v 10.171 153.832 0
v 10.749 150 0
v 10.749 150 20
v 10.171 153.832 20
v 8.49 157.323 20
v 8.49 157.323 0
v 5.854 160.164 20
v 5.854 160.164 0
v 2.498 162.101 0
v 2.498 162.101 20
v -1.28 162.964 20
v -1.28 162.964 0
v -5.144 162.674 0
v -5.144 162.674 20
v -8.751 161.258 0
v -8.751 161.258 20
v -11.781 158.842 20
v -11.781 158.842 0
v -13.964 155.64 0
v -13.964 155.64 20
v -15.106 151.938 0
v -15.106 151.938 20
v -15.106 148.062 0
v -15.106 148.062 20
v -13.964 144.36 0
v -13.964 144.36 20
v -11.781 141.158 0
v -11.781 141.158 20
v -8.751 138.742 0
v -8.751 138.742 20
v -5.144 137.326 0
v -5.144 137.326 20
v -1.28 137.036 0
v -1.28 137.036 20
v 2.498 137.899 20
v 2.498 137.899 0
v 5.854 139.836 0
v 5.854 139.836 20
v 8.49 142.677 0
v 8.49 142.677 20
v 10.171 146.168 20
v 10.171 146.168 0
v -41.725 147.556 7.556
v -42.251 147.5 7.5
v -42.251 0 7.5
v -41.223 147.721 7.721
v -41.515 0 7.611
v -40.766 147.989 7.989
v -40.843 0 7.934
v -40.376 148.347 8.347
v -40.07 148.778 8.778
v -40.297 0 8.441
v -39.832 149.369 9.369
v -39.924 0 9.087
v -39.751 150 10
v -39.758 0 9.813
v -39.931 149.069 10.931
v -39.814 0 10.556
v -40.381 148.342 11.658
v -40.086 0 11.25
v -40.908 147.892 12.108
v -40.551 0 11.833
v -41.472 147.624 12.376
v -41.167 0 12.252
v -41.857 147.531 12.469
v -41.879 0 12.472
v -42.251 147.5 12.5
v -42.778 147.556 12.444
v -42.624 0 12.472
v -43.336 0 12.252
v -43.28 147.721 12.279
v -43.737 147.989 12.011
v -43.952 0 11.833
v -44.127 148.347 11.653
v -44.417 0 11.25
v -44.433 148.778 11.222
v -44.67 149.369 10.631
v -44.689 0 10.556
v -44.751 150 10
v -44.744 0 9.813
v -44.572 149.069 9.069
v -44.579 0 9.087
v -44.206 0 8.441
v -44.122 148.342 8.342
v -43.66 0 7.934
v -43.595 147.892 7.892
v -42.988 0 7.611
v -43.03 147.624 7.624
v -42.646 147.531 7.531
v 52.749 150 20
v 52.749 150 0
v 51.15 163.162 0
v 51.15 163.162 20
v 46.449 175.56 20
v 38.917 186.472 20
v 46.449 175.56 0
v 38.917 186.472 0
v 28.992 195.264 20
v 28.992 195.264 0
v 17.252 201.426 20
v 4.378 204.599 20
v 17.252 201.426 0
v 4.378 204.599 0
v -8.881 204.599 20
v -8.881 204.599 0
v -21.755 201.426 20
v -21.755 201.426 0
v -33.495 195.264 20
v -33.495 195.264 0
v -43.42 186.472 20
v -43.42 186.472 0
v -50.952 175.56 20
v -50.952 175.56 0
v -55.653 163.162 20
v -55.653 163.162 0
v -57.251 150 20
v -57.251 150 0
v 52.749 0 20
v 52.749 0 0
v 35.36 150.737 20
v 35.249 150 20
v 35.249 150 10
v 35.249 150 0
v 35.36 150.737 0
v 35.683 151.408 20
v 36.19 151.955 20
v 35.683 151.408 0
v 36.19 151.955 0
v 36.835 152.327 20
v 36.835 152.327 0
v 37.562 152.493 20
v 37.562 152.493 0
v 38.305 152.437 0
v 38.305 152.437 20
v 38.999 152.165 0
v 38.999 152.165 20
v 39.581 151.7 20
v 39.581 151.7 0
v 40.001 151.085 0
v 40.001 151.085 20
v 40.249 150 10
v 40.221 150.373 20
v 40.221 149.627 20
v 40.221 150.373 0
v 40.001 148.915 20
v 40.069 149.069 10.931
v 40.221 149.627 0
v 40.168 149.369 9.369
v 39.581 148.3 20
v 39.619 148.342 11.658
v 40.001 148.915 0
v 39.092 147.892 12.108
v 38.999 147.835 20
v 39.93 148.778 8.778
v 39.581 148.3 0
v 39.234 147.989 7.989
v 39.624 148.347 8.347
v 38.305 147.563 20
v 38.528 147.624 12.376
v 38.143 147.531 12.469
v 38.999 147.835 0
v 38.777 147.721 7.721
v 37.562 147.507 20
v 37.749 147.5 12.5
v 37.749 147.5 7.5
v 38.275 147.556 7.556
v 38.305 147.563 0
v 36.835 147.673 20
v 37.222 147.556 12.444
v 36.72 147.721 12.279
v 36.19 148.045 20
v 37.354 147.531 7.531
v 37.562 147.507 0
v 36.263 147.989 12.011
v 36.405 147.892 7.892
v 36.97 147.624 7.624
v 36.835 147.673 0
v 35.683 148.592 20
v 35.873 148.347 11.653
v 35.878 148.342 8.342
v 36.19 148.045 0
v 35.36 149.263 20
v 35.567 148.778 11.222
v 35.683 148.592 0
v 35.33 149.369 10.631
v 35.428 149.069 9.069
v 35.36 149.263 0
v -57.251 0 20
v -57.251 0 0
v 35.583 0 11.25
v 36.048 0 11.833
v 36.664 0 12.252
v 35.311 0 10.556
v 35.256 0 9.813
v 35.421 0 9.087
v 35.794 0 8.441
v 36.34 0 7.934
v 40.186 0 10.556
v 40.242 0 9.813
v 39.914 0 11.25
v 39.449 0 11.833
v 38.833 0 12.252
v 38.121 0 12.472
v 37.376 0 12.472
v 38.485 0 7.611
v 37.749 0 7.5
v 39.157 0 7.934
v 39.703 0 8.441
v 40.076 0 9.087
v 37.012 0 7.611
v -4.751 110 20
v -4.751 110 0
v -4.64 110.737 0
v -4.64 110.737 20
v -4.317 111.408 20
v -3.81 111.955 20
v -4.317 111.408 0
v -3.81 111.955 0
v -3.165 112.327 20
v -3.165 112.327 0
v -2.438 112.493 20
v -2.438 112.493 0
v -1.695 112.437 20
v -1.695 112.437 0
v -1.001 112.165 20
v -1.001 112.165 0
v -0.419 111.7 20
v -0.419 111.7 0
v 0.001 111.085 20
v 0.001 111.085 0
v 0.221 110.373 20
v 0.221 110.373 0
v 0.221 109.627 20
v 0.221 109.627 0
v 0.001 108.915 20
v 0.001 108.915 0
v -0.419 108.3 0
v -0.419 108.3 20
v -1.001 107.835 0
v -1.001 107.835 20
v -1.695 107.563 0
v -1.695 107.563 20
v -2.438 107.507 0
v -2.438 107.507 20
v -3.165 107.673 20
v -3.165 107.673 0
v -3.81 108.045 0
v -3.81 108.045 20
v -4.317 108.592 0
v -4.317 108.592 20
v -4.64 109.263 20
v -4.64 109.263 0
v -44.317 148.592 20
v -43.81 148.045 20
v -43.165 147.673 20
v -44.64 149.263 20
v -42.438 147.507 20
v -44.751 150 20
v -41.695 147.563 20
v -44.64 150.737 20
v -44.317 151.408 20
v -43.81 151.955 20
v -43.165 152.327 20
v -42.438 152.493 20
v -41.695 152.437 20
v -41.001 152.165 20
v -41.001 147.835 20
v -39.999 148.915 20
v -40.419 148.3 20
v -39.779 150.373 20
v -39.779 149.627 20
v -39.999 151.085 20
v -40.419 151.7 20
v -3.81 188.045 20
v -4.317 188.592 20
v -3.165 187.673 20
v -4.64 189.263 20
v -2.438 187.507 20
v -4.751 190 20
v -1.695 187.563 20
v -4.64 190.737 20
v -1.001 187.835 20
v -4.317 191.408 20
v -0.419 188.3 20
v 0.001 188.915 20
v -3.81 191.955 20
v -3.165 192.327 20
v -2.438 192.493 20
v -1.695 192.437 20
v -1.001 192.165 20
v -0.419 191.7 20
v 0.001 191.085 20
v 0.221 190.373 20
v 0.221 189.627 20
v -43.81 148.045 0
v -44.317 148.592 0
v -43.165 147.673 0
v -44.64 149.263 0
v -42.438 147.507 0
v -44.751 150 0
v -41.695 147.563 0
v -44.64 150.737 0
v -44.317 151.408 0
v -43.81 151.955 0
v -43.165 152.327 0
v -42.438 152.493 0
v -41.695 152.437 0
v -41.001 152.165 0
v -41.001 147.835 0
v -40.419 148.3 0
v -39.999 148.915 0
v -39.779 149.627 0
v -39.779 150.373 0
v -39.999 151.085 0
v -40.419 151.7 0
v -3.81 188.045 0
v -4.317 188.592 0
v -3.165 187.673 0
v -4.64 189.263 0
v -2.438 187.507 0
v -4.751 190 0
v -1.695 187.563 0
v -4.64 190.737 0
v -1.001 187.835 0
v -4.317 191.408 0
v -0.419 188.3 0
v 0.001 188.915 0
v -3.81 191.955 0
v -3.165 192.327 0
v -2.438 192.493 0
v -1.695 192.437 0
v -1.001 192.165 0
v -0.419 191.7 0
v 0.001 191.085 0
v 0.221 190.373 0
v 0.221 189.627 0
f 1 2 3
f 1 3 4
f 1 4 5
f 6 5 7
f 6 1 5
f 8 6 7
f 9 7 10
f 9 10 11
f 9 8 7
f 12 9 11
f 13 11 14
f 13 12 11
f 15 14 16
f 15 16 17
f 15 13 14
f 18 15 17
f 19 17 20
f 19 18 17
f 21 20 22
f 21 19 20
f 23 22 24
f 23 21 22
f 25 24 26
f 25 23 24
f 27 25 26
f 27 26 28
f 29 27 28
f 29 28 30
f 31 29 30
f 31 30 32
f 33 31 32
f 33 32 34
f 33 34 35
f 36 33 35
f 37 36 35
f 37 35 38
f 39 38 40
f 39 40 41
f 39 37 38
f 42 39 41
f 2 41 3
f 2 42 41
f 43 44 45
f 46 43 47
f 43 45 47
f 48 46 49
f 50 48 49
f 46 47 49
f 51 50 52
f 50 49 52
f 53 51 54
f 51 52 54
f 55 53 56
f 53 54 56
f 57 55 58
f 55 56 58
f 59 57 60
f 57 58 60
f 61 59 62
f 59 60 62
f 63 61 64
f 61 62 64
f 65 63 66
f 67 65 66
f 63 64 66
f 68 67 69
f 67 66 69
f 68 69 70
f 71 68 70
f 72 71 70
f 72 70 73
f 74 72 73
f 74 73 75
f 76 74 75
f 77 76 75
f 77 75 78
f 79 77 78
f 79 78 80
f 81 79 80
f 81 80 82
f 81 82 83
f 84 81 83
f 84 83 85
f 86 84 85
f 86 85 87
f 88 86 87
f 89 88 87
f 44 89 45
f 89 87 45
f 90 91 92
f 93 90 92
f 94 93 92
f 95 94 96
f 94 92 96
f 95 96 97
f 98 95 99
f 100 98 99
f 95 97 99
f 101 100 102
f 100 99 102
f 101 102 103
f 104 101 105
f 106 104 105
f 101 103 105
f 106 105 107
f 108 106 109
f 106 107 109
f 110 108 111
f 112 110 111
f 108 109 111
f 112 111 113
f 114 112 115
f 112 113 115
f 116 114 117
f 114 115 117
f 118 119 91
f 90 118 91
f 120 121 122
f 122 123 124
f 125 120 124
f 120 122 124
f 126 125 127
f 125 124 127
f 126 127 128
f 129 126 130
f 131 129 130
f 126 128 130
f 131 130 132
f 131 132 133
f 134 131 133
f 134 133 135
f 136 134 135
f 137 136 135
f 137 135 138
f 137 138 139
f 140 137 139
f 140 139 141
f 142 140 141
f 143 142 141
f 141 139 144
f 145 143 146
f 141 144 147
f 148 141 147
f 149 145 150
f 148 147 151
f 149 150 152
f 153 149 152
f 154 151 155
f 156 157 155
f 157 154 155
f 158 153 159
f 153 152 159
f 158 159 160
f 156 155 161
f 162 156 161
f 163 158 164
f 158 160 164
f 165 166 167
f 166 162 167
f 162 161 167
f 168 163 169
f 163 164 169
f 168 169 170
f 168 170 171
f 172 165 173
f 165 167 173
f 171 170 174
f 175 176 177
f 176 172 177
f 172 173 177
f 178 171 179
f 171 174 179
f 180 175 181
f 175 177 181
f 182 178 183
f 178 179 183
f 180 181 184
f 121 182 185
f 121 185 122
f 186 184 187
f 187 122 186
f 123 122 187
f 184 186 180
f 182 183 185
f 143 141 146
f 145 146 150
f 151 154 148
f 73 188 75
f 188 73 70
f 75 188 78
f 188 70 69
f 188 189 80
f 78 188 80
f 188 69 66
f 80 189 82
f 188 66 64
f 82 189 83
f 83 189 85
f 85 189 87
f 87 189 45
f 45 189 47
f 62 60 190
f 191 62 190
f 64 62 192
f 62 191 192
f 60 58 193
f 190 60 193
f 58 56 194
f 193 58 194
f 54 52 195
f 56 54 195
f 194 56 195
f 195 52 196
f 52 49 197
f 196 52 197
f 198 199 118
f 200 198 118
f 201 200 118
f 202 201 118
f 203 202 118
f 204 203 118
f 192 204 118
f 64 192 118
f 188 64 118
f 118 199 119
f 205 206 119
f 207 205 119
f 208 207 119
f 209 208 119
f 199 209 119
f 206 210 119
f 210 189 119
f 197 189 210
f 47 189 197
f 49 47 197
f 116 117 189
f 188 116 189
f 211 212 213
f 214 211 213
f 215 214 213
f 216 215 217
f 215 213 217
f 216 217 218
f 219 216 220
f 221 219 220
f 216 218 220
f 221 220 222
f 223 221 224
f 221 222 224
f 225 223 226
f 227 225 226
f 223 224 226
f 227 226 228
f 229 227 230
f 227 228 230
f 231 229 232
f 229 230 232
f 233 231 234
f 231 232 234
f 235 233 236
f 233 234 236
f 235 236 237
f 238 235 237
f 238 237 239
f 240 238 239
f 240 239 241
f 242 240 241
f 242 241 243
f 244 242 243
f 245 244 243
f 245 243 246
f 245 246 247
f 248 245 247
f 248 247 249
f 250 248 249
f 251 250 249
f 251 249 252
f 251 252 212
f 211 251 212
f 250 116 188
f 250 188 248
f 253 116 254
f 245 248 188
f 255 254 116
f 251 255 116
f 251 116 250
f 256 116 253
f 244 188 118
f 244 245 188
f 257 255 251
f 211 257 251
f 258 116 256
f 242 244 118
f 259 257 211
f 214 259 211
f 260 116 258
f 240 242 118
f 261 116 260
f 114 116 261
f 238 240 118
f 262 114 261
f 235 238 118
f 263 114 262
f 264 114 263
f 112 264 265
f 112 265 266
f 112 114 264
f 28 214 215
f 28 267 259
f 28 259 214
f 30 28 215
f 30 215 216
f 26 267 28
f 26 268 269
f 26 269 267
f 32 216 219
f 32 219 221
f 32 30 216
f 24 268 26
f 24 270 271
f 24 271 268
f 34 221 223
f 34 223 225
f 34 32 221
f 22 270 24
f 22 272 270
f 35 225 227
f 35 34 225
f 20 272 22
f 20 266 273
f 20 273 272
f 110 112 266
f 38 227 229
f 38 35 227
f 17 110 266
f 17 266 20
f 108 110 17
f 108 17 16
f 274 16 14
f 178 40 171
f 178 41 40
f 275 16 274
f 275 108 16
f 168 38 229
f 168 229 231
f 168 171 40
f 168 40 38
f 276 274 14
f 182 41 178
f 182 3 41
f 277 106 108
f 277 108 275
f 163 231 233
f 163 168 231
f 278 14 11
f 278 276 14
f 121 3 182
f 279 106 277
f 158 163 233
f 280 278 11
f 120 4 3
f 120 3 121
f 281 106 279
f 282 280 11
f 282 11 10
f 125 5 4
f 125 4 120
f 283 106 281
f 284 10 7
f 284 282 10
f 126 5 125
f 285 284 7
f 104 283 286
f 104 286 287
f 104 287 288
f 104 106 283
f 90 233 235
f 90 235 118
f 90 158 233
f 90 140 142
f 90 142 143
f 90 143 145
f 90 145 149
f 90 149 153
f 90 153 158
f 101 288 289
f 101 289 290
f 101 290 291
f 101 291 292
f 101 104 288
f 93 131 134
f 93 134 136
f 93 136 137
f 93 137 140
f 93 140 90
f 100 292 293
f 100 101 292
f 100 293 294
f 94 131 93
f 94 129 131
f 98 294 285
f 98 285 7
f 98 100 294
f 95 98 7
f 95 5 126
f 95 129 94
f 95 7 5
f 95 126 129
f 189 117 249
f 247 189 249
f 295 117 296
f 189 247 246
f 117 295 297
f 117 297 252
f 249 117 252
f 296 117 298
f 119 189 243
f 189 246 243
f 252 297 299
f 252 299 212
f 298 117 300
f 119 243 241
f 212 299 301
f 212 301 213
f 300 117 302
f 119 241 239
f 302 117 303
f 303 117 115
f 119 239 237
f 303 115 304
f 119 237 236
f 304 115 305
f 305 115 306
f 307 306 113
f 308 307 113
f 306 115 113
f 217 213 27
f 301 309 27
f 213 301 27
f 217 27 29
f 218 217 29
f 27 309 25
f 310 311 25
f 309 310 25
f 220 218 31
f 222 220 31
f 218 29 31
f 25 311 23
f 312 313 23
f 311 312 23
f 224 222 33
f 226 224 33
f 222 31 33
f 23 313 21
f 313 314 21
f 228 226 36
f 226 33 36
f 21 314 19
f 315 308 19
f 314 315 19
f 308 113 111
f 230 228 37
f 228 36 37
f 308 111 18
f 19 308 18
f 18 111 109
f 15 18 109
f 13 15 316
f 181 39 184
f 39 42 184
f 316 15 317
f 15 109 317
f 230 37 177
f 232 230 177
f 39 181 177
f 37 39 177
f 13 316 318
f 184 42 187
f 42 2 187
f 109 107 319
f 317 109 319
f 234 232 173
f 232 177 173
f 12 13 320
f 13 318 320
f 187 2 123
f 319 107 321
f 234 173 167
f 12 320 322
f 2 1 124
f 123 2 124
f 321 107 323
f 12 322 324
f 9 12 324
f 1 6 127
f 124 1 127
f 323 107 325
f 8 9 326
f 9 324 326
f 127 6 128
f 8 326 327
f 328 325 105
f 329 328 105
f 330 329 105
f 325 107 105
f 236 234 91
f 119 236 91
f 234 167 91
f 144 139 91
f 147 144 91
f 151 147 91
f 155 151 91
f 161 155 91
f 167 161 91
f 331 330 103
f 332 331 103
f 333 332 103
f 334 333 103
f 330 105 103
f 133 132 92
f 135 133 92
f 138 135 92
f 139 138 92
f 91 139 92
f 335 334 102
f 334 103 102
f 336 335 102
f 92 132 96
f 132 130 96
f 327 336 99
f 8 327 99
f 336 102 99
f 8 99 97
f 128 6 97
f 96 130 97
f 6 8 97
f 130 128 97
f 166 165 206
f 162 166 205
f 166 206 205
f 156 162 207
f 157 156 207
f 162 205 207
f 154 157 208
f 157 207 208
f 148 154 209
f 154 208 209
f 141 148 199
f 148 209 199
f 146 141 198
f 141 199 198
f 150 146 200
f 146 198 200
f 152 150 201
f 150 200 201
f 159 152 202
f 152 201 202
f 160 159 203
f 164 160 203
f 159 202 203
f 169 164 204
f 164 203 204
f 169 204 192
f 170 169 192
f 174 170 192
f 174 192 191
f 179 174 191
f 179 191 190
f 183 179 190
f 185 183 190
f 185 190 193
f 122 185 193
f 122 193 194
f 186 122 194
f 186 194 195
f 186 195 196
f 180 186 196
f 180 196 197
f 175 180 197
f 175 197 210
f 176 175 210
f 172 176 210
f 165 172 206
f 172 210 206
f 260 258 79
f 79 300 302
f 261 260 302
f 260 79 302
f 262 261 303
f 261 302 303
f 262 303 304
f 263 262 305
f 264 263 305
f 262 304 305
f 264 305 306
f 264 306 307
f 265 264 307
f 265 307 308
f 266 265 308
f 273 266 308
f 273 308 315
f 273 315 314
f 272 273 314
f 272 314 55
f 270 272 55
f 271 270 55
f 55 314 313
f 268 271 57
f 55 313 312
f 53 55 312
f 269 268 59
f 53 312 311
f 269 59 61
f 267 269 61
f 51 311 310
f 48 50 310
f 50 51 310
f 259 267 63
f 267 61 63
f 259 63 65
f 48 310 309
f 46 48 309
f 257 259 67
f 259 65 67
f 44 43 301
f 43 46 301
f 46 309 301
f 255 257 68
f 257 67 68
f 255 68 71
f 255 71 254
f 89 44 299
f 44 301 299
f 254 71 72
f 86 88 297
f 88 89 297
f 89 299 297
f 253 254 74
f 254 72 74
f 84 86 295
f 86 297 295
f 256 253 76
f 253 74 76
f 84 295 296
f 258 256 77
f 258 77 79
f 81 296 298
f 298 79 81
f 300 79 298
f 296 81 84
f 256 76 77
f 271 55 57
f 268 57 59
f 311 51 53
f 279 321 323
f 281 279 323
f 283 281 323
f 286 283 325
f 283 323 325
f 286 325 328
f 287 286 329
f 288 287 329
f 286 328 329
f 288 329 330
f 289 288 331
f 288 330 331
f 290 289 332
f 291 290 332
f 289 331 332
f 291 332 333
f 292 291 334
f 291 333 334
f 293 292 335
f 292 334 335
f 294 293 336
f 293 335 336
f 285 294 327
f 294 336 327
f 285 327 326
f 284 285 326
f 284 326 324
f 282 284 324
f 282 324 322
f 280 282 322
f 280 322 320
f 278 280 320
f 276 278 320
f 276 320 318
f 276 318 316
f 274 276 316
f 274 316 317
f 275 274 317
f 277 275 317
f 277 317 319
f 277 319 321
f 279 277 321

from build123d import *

# Parameters (mm, degrees)
SKETCH1_R                  = 13
BOSS_EXTRUDE1_DEPTH        = 20
F_5_0MM_DOWEL_HOLE1_D      = 5
F_5_0MM_DOWEL_HOLE2_REACH  = 228.164
F_5_0MM_DOWEL_HOLE2_BORE_R = 2.5


with BuildPart() as part:
    # Sketch1 → Boss-Extrude1 (new body)
    with BuildSketch(Plane.XY):
        with BuildLine():
            Line((-57.251461988, 0), (52.748538012, 0))
            Line((52.748538012, 0), (52.748538012, 150))
            ThreePointArc((52.748538012, 150), (-2.251461988, 205), (-57.251461988, 150))
            Line((-57.251461988, 150), (-57.251461988, 0))
        make_face()
        with Locations((-2.251461988, 150)):
            Circle(SKETCH1_R, mode=Mode.SUBTRACT)
    extrude(amount=BOSS_EXTRUDE1_DEPTH)

    # Ø5.0mm Dowel Hole1 (through all)
    with Locations(Plane(origin=(-2.251461988, 190, 20), x_dir=(1, 0, 0), z_dir=(0, 0, 1))):
        with Locations((0, 0), (40, -40), (0, -80), (-40, -40)):
            Hole(F_5_0MM_DOWEL_HOLE1_D / 2)

    # Ø5.0mm Dowel Hole2 bore (on position points) → Ø5.0mm Dowel Hole2 (cut, up to next)
    with BuildSketch(Plane(origin=(-42.251461988, 0, 10), x_dir=(0, 0, -1), z_dir=(0, -1, 0)), mode=Mode.PRIVATE) as f_5_0mm_dowel_hole2_sk1:
        Circle(F_5_0MM_DOWEL_HOLE2_BORE_R)
    f_5_0mm_dowel_hole2_tool1 = extrude(f_5_0mm_dowel_hole2_sk1.sketch, amount=-F_5_0MM_DOWEL_HOLE2_REACH, mode=Mode.PRIVATE) & part.part
    # Ø5.0mm Dowel Hole2 bore (on position points) → Ø5.0mm Dowel Hole2 (cut, up to next)
    with BuildSketch(Plane(origin=(-42.251461988, 0, 10), x_dir=(0, 0, -1), z_dir=(0, -1, 0)), mode=Mode.PRIVATE) as f_5_0mm_dowel_hole2_sk2:
        with Locations((0, 80)):
            Circle(F_5_0MM_DOWEL_HOLE2_BORE_R)
    f_5_0mm_dowel_hole2_tool2 = extrude(f_5_0mm_dowel_hole2_sk2.sketch, amount=-F_5_0MM_DOWEL_HOLE2_REACH, mode=Mode.PRIVATE) & part.part
    add(f_5_0mm_dowel_hole2_tool1.solids().sort_by_distance((-42.251462, 0, 10))[0], mode=Mode.SUBTRACT)
    add(f_5_0mm_dowel_hole2_tool2.solids().sort_by_distance((37.748538, 0, 10))[0], mode=Mode.SUBTRACT)


solid = part.part
